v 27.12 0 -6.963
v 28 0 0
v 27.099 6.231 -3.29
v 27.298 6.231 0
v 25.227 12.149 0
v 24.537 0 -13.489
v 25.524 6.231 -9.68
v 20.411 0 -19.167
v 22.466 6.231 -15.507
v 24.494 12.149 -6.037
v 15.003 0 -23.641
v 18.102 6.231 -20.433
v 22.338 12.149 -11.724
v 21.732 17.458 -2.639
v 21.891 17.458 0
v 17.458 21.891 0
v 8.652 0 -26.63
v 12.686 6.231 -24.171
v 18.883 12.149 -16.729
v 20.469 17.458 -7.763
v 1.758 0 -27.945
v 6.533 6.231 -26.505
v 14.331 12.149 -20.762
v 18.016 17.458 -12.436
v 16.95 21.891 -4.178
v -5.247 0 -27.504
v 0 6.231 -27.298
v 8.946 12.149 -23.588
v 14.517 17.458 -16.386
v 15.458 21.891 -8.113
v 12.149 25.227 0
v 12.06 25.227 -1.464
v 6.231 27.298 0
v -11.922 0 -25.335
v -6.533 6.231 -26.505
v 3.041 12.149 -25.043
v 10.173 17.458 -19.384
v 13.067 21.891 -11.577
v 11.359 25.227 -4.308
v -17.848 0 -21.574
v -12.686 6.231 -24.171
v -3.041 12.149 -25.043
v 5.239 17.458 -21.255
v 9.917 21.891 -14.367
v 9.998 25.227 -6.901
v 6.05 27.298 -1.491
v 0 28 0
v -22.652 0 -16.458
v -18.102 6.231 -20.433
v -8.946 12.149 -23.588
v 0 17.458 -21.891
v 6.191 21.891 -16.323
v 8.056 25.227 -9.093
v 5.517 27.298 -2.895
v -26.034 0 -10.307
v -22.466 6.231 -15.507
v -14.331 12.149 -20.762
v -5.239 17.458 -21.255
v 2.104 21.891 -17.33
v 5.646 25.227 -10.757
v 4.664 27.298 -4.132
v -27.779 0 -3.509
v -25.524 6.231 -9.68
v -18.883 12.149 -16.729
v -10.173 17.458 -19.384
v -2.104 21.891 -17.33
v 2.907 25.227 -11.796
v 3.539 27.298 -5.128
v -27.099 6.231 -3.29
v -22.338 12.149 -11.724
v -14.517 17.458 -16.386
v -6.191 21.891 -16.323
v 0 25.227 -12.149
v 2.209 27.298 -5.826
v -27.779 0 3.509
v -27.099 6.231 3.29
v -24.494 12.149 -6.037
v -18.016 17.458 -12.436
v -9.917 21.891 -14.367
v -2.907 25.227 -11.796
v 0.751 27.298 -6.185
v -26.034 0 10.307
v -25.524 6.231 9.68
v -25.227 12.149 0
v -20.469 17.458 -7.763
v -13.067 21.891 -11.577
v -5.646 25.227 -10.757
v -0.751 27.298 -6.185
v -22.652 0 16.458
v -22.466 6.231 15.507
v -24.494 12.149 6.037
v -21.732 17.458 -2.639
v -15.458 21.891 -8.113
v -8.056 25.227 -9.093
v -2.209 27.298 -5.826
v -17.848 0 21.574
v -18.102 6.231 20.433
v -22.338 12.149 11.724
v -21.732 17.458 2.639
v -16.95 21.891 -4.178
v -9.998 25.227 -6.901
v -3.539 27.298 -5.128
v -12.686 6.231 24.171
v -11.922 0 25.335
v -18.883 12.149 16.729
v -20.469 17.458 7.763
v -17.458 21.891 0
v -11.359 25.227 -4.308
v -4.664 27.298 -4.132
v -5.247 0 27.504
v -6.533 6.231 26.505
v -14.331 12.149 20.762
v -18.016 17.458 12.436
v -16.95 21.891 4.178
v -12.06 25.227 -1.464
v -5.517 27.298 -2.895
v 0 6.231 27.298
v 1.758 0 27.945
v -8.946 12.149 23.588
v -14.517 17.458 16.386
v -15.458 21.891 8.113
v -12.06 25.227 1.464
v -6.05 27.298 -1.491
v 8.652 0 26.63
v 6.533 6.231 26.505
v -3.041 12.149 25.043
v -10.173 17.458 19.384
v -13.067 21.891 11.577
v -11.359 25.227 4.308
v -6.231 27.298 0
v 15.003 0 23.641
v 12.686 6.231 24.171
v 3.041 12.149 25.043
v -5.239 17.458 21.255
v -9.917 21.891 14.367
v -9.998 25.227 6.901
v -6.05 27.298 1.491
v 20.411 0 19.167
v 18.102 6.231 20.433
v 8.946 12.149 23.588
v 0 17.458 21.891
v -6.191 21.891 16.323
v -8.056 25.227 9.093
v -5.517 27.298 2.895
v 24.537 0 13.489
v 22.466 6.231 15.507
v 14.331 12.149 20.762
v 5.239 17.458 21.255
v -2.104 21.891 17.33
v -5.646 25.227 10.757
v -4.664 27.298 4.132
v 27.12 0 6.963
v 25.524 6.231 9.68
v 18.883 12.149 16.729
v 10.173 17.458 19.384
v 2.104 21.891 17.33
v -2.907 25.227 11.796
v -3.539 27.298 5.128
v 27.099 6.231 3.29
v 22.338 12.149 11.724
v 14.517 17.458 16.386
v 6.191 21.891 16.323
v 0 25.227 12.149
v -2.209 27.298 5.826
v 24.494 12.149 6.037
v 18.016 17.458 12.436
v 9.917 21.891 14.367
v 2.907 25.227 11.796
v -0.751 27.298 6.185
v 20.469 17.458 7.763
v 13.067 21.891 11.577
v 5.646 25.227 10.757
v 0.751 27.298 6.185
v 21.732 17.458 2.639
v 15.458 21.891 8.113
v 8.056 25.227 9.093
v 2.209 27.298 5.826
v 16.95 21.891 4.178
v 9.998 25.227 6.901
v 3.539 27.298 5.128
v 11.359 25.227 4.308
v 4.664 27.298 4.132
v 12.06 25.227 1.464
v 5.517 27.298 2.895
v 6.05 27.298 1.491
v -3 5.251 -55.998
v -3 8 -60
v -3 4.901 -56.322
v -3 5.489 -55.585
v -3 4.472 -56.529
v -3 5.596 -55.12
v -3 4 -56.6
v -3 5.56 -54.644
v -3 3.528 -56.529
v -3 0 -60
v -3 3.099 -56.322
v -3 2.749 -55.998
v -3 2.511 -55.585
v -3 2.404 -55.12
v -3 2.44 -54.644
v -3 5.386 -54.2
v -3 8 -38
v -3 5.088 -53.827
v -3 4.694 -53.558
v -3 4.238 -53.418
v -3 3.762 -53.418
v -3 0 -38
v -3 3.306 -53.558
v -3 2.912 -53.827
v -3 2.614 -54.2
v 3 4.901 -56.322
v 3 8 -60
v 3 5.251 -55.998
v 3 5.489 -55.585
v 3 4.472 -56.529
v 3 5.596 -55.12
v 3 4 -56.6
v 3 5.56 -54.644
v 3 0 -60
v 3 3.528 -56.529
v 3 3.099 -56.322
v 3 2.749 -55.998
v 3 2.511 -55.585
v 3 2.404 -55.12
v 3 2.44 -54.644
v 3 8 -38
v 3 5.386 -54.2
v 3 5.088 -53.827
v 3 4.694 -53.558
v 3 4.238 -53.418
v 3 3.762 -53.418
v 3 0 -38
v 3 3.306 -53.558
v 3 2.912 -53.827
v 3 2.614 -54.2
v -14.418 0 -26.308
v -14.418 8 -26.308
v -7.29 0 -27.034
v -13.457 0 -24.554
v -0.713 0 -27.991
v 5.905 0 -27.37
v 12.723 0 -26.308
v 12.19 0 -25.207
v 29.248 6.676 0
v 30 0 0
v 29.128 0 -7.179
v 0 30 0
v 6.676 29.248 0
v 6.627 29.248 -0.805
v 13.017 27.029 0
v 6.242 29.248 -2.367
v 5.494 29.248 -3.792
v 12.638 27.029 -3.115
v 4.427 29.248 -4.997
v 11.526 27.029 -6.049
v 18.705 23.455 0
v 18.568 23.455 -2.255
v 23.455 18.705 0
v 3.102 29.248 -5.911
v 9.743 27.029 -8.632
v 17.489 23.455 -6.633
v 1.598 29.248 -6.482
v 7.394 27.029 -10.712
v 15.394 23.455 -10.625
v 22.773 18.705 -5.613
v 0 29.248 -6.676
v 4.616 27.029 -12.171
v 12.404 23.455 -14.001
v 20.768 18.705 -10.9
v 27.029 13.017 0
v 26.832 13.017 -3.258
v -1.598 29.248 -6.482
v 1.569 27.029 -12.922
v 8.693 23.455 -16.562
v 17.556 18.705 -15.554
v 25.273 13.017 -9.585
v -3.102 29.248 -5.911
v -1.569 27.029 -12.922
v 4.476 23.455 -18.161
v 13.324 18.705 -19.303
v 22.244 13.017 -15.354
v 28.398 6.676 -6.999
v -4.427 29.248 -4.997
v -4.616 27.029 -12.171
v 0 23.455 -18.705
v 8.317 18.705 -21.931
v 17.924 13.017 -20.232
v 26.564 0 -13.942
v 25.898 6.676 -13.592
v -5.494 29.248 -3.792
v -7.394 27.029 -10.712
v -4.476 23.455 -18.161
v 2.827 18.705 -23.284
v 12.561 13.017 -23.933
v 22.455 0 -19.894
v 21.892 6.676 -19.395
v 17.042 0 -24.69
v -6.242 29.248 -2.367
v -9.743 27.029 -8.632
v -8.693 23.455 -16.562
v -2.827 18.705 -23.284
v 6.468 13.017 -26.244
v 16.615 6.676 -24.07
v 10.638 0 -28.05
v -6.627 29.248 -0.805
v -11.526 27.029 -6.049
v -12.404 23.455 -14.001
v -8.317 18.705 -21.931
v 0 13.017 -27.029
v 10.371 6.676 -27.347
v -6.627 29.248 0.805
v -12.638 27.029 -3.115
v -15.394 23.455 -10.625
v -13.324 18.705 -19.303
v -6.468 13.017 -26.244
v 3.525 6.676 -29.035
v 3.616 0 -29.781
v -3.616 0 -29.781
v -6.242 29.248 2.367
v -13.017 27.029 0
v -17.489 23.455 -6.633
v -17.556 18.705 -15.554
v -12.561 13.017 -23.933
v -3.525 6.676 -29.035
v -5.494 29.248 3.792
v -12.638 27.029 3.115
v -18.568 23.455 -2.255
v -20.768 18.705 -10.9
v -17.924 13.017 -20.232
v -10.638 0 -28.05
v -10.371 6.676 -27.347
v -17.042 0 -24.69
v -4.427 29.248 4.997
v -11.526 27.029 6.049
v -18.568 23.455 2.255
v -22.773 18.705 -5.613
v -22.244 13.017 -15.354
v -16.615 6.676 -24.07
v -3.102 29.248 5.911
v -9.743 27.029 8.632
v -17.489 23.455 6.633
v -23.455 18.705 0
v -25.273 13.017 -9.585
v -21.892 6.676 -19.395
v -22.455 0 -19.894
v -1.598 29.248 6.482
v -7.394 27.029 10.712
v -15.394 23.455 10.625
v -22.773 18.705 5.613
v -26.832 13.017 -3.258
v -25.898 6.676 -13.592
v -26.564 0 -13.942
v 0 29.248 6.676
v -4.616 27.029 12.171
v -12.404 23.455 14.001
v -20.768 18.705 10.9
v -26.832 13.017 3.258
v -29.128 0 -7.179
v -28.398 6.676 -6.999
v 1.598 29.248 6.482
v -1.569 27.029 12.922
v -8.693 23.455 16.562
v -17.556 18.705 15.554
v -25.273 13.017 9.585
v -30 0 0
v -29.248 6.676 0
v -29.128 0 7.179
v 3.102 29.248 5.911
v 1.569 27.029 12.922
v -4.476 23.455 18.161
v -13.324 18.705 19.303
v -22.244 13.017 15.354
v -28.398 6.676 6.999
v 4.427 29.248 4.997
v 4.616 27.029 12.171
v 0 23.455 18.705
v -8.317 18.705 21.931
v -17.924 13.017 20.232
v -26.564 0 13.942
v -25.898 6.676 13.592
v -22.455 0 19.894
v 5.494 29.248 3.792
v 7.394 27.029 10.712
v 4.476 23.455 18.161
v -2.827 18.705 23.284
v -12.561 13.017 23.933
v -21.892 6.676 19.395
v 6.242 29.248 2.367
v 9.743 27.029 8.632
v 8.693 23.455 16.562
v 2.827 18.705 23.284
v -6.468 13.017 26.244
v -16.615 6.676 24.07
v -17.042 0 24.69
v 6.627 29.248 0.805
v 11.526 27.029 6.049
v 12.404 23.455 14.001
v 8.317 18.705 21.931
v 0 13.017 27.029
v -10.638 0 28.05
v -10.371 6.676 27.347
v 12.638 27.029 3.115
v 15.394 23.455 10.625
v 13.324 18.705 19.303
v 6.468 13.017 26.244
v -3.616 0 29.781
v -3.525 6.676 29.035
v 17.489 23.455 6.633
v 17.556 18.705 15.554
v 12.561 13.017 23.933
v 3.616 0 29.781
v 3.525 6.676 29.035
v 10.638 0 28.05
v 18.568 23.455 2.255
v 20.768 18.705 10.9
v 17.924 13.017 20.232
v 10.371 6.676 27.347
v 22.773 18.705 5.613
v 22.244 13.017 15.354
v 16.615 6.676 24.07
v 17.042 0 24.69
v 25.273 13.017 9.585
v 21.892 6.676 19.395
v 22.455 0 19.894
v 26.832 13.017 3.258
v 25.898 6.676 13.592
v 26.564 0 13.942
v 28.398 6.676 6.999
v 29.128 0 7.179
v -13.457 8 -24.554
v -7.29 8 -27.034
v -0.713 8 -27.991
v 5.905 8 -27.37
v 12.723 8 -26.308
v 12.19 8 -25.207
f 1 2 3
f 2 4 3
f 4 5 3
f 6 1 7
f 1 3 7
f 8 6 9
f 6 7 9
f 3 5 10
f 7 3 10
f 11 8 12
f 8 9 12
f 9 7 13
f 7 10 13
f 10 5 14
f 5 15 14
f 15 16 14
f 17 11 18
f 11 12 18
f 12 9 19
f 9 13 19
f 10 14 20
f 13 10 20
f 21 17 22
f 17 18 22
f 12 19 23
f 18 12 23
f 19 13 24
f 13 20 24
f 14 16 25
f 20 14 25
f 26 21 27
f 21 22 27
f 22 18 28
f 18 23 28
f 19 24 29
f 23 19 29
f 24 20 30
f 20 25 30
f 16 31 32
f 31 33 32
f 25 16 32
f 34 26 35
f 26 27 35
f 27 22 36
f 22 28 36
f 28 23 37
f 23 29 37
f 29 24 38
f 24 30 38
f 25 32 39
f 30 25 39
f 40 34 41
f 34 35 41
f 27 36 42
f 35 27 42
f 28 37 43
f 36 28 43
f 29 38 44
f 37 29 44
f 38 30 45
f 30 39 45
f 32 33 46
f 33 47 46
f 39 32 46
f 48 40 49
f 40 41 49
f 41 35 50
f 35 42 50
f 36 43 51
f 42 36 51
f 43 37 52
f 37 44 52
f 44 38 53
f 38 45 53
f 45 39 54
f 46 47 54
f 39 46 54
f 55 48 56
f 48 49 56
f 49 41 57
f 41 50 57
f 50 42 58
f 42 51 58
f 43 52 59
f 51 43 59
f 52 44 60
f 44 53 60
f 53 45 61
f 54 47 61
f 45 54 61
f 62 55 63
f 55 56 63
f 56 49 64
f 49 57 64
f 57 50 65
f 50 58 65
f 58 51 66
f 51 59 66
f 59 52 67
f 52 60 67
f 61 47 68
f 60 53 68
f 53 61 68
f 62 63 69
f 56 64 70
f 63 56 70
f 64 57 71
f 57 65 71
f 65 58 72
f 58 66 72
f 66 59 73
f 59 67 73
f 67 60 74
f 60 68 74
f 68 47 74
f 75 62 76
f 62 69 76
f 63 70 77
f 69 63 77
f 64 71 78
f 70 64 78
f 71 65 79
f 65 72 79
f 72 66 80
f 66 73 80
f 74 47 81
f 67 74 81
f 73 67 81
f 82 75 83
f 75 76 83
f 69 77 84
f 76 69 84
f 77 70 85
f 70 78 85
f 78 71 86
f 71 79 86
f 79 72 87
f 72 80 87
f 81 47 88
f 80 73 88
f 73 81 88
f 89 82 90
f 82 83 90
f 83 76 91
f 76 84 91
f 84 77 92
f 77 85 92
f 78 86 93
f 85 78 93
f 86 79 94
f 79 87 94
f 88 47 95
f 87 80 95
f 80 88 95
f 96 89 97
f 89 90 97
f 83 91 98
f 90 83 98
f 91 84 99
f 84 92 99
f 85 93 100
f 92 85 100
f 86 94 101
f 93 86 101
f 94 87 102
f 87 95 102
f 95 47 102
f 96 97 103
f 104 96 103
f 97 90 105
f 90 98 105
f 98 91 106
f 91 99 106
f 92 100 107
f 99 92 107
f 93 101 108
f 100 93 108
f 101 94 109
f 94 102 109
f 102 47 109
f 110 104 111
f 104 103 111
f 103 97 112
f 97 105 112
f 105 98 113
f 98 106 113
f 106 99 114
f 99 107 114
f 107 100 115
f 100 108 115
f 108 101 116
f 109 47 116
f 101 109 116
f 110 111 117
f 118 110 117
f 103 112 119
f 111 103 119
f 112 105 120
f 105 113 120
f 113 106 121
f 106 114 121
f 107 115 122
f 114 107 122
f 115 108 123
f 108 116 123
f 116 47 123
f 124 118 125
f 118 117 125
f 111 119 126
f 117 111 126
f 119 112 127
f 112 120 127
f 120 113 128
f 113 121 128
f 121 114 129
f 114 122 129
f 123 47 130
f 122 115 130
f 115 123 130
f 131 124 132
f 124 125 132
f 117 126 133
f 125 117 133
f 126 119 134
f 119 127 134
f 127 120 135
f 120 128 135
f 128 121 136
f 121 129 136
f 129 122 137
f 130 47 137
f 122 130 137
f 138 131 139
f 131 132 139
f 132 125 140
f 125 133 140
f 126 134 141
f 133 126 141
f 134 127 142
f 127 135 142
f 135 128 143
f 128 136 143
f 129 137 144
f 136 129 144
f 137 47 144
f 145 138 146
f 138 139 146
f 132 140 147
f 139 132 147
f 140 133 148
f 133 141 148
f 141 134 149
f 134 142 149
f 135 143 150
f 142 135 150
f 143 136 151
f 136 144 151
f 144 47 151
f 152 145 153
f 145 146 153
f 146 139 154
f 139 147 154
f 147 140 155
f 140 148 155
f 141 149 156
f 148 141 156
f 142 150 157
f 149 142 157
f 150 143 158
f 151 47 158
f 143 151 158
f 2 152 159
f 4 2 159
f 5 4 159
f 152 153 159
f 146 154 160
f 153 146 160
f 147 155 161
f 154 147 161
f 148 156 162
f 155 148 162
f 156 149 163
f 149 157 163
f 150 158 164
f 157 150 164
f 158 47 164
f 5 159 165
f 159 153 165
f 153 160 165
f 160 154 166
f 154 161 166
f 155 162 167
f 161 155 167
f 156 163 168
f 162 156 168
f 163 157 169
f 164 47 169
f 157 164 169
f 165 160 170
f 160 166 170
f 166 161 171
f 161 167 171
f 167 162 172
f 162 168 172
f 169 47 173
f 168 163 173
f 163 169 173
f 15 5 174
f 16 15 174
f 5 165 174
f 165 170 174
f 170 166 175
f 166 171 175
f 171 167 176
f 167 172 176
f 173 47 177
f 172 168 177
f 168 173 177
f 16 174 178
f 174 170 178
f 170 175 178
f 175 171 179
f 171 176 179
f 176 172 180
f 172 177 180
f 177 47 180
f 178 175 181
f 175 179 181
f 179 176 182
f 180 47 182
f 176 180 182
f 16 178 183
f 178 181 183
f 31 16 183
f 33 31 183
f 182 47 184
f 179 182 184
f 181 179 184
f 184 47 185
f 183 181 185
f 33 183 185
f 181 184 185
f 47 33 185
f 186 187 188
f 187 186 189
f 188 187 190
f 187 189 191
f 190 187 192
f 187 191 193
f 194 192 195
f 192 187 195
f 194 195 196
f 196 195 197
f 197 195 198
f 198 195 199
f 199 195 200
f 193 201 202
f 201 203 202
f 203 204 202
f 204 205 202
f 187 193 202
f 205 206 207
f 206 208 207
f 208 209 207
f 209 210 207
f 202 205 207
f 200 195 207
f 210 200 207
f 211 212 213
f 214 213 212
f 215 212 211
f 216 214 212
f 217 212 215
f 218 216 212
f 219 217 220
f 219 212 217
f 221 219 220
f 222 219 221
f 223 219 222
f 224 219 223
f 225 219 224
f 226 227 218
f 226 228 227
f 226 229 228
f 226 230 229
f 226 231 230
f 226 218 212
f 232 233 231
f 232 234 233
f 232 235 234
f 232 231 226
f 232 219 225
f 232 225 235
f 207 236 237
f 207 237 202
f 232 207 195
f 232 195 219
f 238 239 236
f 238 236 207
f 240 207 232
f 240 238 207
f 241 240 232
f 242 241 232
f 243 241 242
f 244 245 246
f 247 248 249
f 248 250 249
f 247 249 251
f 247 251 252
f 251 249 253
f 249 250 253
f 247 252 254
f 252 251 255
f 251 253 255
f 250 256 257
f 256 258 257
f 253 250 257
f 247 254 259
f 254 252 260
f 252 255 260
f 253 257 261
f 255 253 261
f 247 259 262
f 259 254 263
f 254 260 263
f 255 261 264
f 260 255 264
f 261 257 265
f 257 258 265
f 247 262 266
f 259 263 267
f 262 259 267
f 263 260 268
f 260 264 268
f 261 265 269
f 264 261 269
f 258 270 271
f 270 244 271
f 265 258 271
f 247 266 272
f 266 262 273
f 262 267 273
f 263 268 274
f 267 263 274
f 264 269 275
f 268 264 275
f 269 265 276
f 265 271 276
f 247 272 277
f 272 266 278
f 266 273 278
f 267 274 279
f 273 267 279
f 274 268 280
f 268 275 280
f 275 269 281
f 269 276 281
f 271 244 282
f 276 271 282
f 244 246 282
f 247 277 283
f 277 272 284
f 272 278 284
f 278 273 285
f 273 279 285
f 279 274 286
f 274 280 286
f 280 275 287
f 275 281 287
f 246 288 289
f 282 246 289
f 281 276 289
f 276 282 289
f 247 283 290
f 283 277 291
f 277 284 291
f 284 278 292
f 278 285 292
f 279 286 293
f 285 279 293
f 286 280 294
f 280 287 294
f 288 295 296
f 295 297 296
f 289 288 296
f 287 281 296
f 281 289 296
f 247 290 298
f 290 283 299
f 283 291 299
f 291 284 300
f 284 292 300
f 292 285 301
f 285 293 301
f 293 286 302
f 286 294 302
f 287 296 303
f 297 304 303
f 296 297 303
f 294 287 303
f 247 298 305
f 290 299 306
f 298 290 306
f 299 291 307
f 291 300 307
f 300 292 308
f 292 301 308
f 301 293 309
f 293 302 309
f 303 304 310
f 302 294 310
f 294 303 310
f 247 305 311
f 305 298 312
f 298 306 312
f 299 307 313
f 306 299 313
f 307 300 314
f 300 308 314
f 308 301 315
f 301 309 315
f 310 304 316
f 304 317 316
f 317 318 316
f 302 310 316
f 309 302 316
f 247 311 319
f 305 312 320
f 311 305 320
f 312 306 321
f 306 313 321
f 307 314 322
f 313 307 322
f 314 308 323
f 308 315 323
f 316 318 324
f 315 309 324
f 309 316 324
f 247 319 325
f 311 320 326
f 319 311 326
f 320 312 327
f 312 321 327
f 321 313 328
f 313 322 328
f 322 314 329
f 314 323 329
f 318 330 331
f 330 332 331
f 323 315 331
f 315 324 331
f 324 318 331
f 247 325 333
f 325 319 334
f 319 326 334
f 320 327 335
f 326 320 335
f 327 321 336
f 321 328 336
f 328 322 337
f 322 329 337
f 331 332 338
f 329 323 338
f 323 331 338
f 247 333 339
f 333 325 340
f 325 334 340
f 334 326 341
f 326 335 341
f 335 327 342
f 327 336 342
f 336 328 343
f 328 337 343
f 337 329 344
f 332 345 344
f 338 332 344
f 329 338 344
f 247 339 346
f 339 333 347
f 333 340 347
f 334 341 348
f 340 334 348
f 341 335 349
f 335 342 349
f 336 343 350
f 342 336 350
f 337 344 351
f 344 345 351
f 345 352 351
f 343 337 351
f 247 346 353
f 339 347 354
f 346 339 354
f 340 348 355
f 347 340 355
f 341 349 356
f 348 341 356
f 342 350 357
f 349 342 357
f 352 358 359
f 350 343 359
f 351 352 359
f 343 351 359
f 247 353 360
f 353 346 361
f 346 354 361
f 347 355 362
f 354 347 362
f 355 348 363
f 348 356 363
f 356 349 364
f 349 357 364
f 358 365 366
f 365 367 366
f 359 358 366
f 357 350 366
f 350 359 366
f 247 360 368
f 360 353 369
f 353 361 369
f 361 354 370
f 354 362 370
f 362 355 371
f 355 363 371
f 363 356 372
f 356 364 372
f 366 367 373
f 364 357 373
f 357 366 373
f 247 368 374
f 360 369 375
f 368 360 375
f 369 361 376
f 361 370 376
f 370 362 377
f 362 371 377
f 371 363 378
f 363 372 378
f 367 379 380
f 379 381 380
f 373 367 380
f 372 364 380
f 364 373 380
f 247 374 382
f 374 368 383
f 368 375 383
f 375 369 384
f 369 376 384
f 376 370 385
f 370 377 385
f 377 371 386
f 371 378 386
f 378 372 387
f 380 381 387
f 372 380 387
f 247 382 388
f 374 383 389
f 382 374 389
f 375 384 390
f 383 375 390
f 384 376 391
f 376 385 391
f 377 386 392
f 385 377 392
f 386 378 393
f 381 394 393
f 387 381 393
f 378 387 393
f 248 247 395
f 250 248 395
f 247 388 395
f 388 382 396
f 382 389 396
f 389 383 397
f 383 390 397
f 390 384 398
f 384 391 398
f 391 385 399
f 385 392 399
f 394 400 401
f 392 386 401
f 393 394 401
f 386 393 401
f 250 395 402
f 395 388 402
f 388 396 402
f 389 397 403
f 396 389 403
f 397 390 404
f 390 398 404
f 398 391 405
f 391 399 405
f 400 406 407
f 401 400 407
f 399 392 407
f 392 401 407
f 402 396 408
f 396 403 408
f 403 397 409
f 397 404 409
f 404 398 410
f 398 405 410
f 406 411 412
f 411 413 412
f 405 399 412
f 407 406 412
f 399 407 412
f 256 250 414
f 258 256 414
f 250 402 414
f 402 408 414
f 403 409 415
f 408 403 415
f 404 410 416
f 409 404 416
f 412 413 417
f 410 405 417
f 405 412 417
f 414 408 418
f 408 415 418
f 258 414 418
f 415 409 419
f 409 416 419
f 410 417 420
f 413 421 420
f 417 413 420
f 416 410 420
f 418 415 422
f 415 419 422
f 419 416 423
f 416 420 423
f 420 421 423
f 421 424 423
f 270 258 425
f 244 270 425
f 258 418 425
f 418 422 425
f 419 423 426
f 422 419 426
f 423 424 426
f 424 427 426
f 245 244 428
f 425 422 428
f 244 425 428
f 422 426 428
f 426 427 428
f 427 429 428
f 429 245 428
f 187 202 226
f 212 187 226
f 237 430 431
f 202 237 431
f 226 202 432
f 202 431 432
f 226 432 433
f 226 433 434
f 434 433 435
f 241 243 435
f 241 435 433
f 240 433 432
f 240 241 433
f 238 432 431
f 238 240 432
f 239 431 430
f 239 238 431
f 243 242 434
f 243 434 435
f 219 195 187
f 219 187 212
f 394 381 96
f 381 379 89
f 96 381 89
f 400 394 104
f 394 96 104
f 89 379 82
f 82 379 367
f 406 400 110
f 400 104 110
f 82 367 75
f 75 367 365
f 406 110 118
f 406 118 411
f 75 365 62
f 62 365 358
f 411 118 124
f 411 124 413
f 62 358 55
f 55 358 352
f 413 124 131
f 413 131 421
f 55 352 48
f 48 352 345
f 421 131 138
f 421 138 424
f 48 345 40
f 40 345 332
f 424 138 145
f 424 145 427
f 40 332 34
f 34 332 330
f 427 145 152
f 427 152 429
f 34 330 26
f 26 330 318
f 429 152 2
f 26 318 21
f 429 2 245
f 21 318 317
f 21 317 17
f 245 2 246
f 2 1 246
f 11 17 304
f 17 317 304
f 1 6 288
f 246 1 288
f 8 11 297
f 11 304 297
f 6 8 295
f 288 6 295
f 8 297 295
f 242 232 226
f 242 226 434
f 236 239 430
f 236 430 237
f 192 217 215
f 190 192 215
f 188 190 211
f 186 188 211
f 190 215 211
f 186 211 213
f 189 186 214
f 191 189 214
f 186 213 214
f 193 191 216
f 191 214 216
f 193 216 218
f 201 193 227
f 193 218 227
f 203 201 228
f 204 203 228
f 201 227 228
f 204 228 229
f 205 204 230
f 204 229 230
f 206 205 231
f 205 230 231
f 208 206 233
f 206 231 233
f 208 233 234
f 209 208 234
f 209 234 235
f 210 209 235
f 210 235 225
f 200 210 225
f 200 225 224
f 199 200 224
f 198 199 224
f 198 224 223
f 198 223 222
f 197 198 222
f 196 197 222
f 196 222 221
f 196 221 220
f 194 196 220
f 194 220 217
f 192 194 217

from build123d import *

# Parameters (mm, degrees)
SKETCH3_W           = 6
SKETCH3_H           = 30
BOSS_EXTRUDE1_DEPTH = 8
SKETCH4_R           = 1.6
CUT_EXTRUDE1_DEPTH  = 75.759614766


with BuildPart() as part:
    # Sketch2 → Revolve1 (revolve)
    with BuildSketch(Plane.XY):
        with BuildLine():
            Line((0, 28), (0, 30))
            ThreePointArc((0, 30), (21.213203436, 21.213203436), (30, 0))
            Line((30, 0), (28, 0))
            ThreePointArc((28, 0), (19.798989873, 19.798989873), (0, 28))
        make_face()
    revolve(axis=Axis((0, 0, 0), (0, 1, 0)))


with BuildPart() as body_2:
    # Sketch3 → Boss-Extrude1 (new body)
    with BuildSketch(Plane.XZ):
        with Locations((0, -45)):
            Rectangle(SKETCH3_W, SKETCH3_H)
        with BuildLine():
            Line((-3, -38), (3, -38))
            Line((3, -38), (12.72277757, -26.308006594))
            Line((12.72277757, -26.308006594), (12.190346348, -25.20705171))
            ThreePointArc((12.190346348, -25.20705171), (-0.71257008, -27.990931458), (-13.45712577, -24.554139488))
            Line((-13.45712577, -24.554139488), (-14.41834904, -26.308006594))
            Line((-14.41834904, -26.308006594), (-3, -38))
        make_face()
    extrude(amount=-BOSS_EXTRUDE1_DEPTH)

    # Sketch4 → Cut-Extrude1 (cut, through all)
    with BuildSketch(Plane(origin=(3, 0, 0), x_dir=(0, 0, -1), z_dir=(1, 0, 0))):
        with Locations((55, 4)):
            Circle(SKETCH4_R)
    extrude(amount=-CUT_EXTRUDE1_DEPTH, mode=Mode.SUBTRACT)


solid = Compound([part.part, body_2.part])
